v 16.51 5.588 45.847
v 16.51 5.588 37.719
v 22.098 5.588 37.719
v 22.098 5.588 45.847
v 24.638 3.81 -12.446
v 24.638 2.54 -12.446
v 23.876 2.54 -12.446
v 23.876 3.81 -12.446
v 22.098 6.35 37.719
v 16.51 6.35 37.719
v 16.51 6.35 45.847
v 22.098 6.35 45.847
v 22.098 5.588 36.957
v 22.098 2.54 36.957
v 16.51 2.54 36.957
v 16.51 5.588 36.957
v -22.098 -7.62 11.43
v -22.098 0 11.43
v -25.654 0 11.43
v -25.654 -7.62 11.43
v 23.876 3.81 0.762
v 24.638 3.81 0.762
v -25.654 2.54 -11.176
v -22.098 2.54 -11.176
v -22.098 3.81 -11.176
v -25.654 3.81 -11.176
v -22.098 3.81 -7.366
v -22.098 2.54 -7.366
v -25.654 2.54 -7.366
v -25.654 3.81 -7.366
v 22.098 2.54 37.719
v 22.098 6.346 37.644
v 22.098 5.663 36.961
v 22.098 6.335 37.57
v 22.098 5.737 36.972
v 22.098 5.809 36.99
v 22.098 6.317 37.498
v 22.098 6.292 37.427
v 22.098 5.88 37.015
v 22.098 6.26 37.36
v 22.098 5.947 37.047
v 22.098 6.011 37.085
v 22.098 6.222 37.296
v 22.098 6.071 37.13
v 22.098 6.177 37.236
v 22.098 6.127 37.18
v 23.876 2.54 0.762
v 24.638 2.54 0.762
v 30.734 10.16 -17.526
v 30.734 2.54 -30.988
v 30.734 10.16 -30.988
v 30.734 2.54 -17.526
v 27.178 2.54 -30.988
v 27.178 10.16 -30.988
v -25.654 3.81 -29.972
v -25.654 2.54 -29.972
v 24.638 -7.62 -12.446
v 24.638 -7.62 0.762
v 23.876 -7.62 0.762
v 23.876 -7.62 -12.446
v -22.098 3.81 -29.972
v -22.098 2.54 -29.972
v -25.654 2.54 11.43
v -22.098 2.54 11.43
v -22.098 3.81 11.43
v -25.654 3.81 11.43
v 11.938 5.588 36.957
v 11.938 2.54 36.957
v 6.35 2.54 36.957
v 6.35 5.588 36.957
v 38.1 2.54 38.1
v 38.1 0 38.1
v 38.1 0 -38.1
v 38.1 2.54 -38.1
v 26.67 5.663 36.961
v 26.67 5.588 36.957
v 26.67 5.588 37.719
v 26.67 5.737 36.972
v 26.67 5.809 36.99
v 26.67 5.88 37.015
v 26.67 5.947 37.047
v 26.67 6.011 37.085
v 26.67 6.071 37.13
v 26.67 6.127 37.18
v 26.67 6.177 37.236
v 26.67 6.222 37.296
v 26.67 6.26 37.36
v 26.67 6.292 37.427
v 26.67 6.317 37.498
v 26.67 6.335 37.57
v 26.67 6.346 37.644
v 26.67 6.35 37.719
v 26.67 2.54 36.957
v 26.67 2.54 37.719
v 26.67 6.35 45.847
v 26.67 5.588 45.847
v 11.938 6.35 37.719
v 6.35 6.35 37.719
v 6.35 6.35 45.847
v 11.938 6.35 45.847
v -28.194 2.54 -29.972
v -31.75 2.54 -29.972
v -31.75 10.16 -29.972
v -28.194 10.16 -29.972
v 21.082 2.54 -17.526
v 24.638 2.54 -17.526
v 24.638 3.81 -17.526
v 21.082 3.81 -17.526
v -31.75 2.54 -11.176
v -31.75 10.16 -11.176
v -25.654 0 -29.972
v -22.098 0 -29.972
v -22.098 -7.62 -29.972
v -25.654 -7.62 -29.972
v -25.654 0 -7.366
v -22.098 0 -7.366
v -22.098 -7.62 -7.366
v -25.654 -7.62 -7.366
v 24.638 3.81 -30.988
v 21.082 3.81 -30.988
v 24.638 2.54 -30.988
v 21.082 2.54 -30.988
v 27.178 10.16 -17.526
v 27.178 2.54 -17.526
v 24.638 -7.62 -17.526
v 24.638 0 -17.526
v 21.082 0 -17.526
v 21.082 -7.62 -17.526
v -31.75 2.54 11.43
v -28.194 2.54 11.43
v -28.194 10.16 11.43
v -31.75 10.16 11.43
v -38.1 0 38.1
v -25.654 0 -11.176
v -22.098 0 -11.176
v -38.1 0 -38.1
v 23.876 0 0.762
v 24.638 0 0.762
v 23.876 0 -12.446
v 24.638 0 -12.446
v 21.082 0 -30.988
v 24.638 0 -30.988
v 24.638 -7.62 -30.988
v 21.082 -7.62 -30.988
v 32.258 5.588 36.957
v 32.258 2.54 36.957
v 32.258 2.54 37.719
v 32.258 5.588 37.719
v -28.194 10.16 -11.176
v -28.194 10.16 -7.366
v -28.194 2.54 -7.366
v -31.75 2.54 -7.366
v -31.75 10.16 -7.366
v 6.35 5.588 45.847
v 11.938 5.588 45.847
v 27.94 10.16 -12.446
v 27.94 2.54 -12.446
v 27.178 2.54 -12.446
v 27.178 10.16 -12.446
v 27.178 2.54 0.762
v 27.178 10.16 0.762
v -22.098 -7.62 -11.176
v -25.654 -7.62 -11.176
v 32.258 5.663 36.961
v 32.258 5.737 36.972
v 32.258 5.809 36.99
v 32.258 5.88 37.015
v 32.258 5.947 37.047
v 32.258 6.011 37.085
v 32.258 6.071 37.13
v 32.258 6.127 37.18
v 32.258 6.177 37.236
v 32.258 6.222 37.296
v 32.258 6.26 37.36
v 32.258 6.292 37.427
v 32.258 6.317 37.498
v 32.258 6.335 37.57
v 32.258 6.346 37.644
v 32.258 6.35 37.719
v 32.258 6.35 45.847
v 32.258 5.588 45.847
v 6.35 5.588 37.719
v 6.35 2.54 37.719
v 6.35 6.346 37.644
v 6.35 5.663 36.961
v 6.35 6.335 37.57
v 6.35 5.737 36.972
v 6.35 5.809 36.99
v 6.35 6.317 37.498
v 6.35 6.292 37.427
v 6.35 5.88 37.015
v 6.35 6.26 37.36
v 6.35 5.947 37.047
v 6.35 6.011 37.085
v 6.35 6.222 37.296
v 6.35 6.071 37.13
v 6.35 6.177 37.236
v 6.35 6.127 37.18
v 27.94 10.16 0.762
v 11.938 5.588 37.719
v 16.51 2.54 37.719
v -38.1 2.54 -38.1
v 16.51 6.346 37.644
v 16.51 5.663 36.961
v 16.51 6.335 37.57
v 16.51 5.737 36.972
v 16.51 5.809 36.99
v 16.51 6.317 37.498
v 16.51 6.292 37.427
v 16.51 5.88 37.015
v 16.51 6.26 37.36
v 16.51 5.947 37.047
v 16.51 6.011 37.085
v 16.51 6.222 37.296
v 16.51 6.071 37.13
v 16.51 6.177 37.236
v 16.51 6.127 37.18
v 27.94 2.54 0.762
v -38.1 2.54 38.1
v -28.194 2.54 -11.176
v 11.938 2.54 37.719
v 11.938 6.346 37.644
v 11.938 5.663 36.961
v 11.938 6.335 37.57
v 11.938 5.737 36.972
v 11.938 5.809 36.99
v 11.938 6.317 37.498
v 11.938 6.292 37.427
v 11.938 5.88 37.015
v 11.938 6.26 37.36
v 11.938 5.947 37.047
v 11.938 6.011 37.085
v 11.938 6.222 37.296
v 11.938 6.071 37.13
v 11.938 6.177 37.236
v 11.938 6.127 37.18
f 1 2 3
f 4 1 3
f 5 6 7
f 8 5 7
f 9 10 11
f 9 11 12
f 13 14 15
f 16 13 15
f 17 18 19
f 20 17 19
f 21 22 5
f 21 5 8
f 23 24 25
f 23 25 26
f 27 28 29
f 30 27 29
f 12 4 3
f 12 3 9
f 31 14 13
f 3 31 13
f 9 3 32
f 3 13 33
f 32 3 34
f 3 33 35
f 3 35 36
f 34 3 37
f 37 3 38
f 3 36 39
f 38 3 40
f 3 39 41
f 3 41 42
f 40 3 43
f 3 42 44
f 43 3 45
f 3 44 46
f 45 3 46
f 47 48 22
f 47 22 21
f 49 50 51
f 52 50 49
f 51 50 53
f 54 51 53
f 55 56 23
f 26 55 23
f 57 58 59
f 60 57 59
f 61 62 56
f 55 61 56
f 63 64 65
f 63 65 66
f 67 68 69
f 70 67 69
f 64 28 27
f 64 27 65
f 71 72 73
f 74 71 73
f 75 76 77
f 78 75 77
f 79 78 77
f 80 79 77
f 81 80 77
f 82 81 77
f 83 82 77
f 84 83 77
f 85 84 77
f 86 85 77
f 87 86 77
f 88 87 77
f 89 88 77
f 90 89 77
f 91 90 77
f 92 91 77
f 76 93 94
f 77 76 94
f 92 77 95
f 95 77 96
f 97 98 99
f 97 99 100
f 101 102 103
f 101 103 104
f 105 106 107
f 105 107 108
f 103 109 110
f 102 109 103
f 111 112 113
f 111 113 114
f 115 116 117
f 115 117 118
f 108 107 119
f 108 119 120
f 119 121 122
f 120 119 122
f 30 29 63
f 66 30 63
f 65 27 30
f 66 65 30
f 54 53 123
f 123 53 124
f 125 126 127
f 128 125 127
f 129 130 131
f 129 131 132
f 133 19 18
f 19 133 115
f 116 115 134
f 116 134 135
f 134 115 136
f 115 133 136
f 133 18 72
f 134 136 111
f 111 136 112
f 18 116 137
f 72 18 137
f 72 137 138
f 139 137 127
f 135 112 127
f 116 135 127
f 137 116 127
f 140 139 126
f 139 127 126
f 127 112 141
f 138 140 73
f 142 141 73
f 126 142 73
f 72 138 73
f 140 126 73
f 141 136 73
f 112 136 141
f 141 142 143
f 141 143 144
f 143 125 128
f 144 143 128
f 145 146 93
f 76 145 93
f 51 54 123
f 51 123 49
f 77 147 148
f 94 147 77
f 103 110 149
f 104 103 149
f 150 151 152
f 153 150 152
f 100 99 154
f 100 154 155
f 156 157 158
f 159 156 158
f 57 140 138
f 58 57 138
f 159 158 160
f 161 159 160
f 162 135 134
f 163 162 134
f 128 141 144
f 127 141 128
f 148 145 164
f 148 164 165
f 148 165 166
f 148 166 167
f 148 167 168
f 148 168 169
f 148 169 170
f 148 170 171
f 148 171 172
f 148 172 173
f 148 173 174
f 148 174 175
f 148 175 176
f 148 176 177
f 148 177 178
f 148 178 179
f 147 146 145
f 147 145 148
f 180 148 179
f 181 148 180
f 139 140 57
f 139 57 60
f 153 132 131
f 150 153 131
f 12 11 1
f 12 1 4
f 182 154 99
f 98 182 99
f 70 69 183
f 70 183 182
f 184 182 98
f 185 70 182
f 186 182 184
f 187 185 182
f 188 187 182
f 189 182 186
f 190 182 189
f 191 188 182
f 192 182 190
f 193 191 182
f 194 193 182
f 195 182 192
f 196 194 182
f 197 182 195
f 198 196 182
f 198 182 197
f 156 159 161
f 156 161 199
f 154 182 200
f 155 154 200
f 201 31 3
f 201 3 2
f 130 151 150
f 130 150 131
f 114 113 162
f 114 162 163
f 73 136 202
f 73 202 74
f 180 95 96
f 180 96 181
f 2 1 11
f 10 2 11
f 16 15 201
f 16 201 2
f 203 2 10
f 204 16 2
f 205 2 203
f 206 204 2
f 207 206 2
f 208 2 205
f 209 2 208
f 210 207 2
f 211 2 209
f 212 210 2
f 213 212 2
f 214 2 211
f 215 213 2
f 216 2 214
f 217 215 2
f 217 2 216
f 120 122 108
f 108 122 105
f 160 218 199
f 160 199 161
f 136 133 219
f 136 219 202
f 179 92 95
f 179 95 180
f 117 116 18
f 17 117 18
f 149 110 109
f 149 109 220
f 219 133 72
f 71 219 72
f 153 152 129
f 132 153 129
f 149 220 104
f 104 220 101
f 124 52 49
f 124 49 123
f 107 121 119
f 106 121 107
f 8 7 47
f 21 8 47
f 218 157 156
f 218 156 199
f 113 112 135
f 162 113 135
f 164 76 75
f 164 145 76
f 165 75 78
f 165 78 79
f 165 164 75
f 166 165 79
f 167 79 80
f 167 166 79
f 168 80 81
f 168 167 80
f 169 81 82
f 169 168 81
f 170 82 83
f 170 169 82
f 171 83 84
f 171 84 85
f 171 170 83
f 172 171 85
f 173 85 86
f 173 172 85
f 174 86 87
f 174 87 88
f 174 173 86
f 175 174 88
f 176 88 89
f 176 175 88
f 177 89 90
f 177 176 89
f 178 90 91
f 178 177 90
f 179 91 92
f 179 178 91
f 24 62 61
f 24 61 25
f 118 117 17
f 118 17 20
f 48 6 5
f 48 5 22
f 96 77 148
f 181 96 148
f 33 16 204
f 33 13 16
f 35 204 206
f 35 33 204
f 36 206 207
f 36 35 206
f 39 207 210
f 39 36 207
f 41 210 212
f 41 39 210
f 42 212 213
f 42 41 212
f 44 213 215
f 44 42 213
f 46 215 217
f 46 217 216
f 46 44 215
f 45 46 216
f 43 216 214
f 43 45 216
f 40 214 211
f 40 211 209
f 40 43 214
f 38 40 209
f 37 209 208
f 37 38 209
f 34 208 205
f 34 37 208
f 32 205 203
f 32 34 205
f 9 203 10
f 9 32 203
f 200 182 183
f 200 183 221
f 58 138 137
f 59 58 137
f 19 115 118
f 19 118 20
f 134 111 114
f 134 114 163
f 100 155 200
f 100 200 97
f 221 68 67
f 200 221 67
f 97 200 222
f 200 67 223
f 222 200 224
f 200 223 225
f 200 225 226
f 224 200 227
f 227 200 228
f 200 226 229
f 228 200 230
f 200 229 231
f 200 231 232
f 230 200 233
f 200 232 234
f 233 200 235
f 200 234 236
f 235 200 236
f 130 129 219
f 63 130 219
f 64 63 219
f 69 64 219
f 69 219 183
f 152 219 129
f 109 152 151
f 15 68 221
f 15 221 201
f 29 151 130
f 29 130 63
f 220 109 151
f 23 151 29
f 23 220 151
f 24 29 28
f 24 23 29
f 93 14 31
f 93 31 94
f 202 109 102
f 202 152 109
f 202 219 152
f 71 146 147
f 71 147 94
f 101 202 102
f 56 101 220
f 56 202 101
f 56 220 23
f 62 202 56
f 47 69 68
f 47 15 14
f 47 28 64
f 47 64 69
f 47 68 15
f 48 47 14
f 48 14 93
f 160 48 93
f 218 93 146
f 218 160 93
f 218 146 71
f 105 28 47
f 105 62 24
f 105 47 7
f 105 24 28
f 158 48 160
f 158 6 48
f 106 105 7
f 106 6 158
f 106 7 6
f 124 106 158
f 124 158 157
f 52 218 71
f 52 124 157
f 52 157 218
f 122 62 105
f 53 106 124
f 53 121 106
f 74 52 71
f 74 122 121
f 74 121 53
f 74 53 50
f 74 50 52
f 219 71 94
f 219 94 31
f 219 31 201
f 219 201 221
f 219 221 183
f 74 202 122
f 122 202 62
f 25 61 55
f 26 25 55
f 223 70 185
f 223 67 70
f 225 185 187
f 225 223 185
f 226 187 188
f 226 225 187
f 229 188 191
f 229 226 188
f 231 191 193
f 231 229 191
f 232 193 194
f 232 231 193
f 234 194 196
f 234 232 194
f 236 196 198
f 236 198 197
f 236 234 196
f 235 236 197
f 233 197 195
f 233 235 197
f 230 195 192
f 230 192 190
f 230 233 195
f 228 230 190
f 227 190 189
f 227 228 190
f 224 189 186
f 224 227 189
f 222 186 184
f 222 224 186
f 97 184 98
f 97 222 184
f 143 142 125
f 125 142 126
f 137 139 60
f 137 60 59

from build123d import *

# Parameters (mm, degrees)
SKETCH1_W           = 76.2
SKETCH1_H           = 76.2
EXTRUDE1_DEPTH      = 2.54
SKETCH2_W           = 3.556
SKETCH2_H           = 13.462
SKETCH2_W_2         = 0.762
SKETCH2_H_2         = 13.208
SKETCH2_H_3         = 18.796
EXTRUDE2_DEPTH      = 1.27
EXTRUDE2_DEPTH_BACK = 10.1601
SKETCH3_W           = 5.588
SKETCH3_H           = 0.762
EXTRUDE3_DEPTH      = 3.048
LPATTERN1_COUNT     = 3
LPATTERN1_PITCH     = 10.16
SKETCH8_W           = 5.588
SKETCH8_H           = 0.762
REVOLVE3_ANGLE      = 90
SKETCH9_W           = 5.588
SKETCH9_H           = 0.762
EXTRUDE5_DEPTH      = 8.128
LPATTERN2_COUNT     = 3
LPATTERN2_PITCH     = 10.16
SKETCH11_W          = 3.556
SKETCH11_H          = 18.796
SKETCH11_W_2        = 0.762
SKETCH11_H_2        = 13.208
SKETCH11_H_3        = 13.462
EXTRUDE6_DEPTH      = 6.35
SKETCH12_W          = 3.556
SKETCH12_H          = 18.796
SKETCH12_H_2        = 13.462
SKETCH12_W_2        = 0.762
SKETCH12_H_3        = 13.208
EXTRUDE7_DEPTH      = 7.6201


with BuildPart() as part:
    # Sketch1 → Extrude1 (new body)
    with BuildSketch(Plane(origin=(0, 0, 0), x_dir=(1, 0, 0), z_dir=(0, 1, 0))):
        Rectangle(SKETCH1_W, SKETCH1_H)
    extrude(amount=EXTRUDE1_DEPTH)

    # Sketch2 → Extrude2 (add, two sides)
    with BuildSketch(Plane(origin=(0, 2.54, 0), x_dir=(-1, 0, 0), z_dir=(0, 1, 0))) as extrude2_sk:
        with Locations((-22.86, -24.257)):
            Rectangle(SKETCH2_W, SKETCH2_H)
        with Locations((-24.257, -5.842)):
            Rectangle(SKETCH2_W_2, SKETCH2_H_2)
        with Locations((23.876, -20.574)):
            Rectangle(SKETCH2_W, SKETCH2_H_3)
        with Locations((23.876, 2.032)):
            Rectangle(SKETCH2_W, SKETCH2_H_3)
        with Locations((29.972, -20.574)):
            Rectangle(SKETCH2_W, SKETCH2_H_3)
        with Locations((29.972, 2.032)):
            Rectangle(SKETCH2_W, SKETCH2_H_3)
        with Locations((-28.956, -24.257)):
            Rectangle(SKETCH2_W, SKETCH2_H)
        with Locations((-27.559, -5.842)):
            Rectangle(SKETCH2_W_2, SKETCH2_H_2)
    extrude(amount=EXTRUDE2_DEPTH)
    extrude(extrude2_sk.sketch, amount=-EXTRUDE2_DEPTH_BACK)

    # Sketch3 → Extrude3 (add)
    with BuildSketch(Plane(origin=(0, 2.54, 0), x_dir=(-1, 0, 0), z_dir=(0, 1, 0))):
        with Locations((-9.144, 37.338)):
            Rectangle(SKETCH3_W, SKETCH3_H)
    extrude3 = extrude(amount=EXTRUDE3_DEPTH)

    # LPattern1: Extrude3 ×3
    with Locations(*[(i * LPATTERN1_PITCH, 0, 0) for i in range(1, LPATTERN1_COUNT)]):
        add(extrude3)

    # Sketch8 → Revolve3 (revolve)
    with BuildSketch(Plane(origin=(0, 5.588, 0), x_dir=(1, 0, 0), z_dir=(0, 1, 0))):
        with Locations((9.144, -37.338)):
            Rectangle(SKETCH8_W, SKETCH8_H)
        with Locations((19.304, -37.338)):
            Rectangle(SKETCH8_W, SKETCH8_H)
        with Locations((29.464, -37.338)):
            Rectangle(SKETCH8_W, SKETCH8_H)
    revolve(axis=Axis((6.35, 5.588, 37.719), (1, 0, 0)), revolution_arc=REVOLVE3_ANGLE)

    # Sketch9 → Extrude5 (add)
    with BuildSketch(Plane.XY.offset(37.719)):
        with Locations((9.144, 5.969)):
            Rectangle(SKETCH9_W, SKETCH9_H)
    extrude5 = extrude(amount=EXTRUDE5_DEPTH)

    # LPattern2: Extrude5 ×3
    with Locations(*[(i * LPATTERN2_PITCH, 0, 0) for i in range(1, LPATTERN2_COUNT)]):
        add(extrude5)

    # Sketch11 → Extrude6 (add)
    with BuildSketch(Plane(origin=(0, 3.81, 0), x_dir=(1, 0, 0), z_dir=(0, 1, 0))):
        with Locations((-29.972, 20.574)):
            Rectangle(SKETCH11_W, SKETCH11_H)
        with Locations((-29.972, -2.032)):
            Rectangle(SKETCH11_W, SKETCH11_H)
        with Locations((27.559, 5.842)):
            Rectangle(SKETCH11_W_2, SKETCH11_H_2)
        with Locations((28.956, 24.257)):
            Rectangle(SKETCH11_W, SKETCH11_H_3)
    extrude(amount=EXTRUDE6_DEPTH)

    # Sketch12 → Extrude7 (cut)
    with BuildSketch(Plane.XZ.offset(7.6201)):
        with Locations((-29.972, -20.574)):
            Rectangle(SKETCH12_W, SKETCH12_H)
        with Locations((-29.972, 2.032)):
            Rectangle(SKETCH12_W, SKETCH12_H)
        with Locations((28.956, -24.257)):
            Rectangle(SKETCH12_W, SKETCH12_H_2)
        with Locations((27.559, -5.842)):
            Rectangle(SKETCH12_W_2, SKETCH12_H_3)
    extrude(amount=-EXTRUDE7_DEPTH, mode=Mode.SUBTRACT)


solid = part.part
